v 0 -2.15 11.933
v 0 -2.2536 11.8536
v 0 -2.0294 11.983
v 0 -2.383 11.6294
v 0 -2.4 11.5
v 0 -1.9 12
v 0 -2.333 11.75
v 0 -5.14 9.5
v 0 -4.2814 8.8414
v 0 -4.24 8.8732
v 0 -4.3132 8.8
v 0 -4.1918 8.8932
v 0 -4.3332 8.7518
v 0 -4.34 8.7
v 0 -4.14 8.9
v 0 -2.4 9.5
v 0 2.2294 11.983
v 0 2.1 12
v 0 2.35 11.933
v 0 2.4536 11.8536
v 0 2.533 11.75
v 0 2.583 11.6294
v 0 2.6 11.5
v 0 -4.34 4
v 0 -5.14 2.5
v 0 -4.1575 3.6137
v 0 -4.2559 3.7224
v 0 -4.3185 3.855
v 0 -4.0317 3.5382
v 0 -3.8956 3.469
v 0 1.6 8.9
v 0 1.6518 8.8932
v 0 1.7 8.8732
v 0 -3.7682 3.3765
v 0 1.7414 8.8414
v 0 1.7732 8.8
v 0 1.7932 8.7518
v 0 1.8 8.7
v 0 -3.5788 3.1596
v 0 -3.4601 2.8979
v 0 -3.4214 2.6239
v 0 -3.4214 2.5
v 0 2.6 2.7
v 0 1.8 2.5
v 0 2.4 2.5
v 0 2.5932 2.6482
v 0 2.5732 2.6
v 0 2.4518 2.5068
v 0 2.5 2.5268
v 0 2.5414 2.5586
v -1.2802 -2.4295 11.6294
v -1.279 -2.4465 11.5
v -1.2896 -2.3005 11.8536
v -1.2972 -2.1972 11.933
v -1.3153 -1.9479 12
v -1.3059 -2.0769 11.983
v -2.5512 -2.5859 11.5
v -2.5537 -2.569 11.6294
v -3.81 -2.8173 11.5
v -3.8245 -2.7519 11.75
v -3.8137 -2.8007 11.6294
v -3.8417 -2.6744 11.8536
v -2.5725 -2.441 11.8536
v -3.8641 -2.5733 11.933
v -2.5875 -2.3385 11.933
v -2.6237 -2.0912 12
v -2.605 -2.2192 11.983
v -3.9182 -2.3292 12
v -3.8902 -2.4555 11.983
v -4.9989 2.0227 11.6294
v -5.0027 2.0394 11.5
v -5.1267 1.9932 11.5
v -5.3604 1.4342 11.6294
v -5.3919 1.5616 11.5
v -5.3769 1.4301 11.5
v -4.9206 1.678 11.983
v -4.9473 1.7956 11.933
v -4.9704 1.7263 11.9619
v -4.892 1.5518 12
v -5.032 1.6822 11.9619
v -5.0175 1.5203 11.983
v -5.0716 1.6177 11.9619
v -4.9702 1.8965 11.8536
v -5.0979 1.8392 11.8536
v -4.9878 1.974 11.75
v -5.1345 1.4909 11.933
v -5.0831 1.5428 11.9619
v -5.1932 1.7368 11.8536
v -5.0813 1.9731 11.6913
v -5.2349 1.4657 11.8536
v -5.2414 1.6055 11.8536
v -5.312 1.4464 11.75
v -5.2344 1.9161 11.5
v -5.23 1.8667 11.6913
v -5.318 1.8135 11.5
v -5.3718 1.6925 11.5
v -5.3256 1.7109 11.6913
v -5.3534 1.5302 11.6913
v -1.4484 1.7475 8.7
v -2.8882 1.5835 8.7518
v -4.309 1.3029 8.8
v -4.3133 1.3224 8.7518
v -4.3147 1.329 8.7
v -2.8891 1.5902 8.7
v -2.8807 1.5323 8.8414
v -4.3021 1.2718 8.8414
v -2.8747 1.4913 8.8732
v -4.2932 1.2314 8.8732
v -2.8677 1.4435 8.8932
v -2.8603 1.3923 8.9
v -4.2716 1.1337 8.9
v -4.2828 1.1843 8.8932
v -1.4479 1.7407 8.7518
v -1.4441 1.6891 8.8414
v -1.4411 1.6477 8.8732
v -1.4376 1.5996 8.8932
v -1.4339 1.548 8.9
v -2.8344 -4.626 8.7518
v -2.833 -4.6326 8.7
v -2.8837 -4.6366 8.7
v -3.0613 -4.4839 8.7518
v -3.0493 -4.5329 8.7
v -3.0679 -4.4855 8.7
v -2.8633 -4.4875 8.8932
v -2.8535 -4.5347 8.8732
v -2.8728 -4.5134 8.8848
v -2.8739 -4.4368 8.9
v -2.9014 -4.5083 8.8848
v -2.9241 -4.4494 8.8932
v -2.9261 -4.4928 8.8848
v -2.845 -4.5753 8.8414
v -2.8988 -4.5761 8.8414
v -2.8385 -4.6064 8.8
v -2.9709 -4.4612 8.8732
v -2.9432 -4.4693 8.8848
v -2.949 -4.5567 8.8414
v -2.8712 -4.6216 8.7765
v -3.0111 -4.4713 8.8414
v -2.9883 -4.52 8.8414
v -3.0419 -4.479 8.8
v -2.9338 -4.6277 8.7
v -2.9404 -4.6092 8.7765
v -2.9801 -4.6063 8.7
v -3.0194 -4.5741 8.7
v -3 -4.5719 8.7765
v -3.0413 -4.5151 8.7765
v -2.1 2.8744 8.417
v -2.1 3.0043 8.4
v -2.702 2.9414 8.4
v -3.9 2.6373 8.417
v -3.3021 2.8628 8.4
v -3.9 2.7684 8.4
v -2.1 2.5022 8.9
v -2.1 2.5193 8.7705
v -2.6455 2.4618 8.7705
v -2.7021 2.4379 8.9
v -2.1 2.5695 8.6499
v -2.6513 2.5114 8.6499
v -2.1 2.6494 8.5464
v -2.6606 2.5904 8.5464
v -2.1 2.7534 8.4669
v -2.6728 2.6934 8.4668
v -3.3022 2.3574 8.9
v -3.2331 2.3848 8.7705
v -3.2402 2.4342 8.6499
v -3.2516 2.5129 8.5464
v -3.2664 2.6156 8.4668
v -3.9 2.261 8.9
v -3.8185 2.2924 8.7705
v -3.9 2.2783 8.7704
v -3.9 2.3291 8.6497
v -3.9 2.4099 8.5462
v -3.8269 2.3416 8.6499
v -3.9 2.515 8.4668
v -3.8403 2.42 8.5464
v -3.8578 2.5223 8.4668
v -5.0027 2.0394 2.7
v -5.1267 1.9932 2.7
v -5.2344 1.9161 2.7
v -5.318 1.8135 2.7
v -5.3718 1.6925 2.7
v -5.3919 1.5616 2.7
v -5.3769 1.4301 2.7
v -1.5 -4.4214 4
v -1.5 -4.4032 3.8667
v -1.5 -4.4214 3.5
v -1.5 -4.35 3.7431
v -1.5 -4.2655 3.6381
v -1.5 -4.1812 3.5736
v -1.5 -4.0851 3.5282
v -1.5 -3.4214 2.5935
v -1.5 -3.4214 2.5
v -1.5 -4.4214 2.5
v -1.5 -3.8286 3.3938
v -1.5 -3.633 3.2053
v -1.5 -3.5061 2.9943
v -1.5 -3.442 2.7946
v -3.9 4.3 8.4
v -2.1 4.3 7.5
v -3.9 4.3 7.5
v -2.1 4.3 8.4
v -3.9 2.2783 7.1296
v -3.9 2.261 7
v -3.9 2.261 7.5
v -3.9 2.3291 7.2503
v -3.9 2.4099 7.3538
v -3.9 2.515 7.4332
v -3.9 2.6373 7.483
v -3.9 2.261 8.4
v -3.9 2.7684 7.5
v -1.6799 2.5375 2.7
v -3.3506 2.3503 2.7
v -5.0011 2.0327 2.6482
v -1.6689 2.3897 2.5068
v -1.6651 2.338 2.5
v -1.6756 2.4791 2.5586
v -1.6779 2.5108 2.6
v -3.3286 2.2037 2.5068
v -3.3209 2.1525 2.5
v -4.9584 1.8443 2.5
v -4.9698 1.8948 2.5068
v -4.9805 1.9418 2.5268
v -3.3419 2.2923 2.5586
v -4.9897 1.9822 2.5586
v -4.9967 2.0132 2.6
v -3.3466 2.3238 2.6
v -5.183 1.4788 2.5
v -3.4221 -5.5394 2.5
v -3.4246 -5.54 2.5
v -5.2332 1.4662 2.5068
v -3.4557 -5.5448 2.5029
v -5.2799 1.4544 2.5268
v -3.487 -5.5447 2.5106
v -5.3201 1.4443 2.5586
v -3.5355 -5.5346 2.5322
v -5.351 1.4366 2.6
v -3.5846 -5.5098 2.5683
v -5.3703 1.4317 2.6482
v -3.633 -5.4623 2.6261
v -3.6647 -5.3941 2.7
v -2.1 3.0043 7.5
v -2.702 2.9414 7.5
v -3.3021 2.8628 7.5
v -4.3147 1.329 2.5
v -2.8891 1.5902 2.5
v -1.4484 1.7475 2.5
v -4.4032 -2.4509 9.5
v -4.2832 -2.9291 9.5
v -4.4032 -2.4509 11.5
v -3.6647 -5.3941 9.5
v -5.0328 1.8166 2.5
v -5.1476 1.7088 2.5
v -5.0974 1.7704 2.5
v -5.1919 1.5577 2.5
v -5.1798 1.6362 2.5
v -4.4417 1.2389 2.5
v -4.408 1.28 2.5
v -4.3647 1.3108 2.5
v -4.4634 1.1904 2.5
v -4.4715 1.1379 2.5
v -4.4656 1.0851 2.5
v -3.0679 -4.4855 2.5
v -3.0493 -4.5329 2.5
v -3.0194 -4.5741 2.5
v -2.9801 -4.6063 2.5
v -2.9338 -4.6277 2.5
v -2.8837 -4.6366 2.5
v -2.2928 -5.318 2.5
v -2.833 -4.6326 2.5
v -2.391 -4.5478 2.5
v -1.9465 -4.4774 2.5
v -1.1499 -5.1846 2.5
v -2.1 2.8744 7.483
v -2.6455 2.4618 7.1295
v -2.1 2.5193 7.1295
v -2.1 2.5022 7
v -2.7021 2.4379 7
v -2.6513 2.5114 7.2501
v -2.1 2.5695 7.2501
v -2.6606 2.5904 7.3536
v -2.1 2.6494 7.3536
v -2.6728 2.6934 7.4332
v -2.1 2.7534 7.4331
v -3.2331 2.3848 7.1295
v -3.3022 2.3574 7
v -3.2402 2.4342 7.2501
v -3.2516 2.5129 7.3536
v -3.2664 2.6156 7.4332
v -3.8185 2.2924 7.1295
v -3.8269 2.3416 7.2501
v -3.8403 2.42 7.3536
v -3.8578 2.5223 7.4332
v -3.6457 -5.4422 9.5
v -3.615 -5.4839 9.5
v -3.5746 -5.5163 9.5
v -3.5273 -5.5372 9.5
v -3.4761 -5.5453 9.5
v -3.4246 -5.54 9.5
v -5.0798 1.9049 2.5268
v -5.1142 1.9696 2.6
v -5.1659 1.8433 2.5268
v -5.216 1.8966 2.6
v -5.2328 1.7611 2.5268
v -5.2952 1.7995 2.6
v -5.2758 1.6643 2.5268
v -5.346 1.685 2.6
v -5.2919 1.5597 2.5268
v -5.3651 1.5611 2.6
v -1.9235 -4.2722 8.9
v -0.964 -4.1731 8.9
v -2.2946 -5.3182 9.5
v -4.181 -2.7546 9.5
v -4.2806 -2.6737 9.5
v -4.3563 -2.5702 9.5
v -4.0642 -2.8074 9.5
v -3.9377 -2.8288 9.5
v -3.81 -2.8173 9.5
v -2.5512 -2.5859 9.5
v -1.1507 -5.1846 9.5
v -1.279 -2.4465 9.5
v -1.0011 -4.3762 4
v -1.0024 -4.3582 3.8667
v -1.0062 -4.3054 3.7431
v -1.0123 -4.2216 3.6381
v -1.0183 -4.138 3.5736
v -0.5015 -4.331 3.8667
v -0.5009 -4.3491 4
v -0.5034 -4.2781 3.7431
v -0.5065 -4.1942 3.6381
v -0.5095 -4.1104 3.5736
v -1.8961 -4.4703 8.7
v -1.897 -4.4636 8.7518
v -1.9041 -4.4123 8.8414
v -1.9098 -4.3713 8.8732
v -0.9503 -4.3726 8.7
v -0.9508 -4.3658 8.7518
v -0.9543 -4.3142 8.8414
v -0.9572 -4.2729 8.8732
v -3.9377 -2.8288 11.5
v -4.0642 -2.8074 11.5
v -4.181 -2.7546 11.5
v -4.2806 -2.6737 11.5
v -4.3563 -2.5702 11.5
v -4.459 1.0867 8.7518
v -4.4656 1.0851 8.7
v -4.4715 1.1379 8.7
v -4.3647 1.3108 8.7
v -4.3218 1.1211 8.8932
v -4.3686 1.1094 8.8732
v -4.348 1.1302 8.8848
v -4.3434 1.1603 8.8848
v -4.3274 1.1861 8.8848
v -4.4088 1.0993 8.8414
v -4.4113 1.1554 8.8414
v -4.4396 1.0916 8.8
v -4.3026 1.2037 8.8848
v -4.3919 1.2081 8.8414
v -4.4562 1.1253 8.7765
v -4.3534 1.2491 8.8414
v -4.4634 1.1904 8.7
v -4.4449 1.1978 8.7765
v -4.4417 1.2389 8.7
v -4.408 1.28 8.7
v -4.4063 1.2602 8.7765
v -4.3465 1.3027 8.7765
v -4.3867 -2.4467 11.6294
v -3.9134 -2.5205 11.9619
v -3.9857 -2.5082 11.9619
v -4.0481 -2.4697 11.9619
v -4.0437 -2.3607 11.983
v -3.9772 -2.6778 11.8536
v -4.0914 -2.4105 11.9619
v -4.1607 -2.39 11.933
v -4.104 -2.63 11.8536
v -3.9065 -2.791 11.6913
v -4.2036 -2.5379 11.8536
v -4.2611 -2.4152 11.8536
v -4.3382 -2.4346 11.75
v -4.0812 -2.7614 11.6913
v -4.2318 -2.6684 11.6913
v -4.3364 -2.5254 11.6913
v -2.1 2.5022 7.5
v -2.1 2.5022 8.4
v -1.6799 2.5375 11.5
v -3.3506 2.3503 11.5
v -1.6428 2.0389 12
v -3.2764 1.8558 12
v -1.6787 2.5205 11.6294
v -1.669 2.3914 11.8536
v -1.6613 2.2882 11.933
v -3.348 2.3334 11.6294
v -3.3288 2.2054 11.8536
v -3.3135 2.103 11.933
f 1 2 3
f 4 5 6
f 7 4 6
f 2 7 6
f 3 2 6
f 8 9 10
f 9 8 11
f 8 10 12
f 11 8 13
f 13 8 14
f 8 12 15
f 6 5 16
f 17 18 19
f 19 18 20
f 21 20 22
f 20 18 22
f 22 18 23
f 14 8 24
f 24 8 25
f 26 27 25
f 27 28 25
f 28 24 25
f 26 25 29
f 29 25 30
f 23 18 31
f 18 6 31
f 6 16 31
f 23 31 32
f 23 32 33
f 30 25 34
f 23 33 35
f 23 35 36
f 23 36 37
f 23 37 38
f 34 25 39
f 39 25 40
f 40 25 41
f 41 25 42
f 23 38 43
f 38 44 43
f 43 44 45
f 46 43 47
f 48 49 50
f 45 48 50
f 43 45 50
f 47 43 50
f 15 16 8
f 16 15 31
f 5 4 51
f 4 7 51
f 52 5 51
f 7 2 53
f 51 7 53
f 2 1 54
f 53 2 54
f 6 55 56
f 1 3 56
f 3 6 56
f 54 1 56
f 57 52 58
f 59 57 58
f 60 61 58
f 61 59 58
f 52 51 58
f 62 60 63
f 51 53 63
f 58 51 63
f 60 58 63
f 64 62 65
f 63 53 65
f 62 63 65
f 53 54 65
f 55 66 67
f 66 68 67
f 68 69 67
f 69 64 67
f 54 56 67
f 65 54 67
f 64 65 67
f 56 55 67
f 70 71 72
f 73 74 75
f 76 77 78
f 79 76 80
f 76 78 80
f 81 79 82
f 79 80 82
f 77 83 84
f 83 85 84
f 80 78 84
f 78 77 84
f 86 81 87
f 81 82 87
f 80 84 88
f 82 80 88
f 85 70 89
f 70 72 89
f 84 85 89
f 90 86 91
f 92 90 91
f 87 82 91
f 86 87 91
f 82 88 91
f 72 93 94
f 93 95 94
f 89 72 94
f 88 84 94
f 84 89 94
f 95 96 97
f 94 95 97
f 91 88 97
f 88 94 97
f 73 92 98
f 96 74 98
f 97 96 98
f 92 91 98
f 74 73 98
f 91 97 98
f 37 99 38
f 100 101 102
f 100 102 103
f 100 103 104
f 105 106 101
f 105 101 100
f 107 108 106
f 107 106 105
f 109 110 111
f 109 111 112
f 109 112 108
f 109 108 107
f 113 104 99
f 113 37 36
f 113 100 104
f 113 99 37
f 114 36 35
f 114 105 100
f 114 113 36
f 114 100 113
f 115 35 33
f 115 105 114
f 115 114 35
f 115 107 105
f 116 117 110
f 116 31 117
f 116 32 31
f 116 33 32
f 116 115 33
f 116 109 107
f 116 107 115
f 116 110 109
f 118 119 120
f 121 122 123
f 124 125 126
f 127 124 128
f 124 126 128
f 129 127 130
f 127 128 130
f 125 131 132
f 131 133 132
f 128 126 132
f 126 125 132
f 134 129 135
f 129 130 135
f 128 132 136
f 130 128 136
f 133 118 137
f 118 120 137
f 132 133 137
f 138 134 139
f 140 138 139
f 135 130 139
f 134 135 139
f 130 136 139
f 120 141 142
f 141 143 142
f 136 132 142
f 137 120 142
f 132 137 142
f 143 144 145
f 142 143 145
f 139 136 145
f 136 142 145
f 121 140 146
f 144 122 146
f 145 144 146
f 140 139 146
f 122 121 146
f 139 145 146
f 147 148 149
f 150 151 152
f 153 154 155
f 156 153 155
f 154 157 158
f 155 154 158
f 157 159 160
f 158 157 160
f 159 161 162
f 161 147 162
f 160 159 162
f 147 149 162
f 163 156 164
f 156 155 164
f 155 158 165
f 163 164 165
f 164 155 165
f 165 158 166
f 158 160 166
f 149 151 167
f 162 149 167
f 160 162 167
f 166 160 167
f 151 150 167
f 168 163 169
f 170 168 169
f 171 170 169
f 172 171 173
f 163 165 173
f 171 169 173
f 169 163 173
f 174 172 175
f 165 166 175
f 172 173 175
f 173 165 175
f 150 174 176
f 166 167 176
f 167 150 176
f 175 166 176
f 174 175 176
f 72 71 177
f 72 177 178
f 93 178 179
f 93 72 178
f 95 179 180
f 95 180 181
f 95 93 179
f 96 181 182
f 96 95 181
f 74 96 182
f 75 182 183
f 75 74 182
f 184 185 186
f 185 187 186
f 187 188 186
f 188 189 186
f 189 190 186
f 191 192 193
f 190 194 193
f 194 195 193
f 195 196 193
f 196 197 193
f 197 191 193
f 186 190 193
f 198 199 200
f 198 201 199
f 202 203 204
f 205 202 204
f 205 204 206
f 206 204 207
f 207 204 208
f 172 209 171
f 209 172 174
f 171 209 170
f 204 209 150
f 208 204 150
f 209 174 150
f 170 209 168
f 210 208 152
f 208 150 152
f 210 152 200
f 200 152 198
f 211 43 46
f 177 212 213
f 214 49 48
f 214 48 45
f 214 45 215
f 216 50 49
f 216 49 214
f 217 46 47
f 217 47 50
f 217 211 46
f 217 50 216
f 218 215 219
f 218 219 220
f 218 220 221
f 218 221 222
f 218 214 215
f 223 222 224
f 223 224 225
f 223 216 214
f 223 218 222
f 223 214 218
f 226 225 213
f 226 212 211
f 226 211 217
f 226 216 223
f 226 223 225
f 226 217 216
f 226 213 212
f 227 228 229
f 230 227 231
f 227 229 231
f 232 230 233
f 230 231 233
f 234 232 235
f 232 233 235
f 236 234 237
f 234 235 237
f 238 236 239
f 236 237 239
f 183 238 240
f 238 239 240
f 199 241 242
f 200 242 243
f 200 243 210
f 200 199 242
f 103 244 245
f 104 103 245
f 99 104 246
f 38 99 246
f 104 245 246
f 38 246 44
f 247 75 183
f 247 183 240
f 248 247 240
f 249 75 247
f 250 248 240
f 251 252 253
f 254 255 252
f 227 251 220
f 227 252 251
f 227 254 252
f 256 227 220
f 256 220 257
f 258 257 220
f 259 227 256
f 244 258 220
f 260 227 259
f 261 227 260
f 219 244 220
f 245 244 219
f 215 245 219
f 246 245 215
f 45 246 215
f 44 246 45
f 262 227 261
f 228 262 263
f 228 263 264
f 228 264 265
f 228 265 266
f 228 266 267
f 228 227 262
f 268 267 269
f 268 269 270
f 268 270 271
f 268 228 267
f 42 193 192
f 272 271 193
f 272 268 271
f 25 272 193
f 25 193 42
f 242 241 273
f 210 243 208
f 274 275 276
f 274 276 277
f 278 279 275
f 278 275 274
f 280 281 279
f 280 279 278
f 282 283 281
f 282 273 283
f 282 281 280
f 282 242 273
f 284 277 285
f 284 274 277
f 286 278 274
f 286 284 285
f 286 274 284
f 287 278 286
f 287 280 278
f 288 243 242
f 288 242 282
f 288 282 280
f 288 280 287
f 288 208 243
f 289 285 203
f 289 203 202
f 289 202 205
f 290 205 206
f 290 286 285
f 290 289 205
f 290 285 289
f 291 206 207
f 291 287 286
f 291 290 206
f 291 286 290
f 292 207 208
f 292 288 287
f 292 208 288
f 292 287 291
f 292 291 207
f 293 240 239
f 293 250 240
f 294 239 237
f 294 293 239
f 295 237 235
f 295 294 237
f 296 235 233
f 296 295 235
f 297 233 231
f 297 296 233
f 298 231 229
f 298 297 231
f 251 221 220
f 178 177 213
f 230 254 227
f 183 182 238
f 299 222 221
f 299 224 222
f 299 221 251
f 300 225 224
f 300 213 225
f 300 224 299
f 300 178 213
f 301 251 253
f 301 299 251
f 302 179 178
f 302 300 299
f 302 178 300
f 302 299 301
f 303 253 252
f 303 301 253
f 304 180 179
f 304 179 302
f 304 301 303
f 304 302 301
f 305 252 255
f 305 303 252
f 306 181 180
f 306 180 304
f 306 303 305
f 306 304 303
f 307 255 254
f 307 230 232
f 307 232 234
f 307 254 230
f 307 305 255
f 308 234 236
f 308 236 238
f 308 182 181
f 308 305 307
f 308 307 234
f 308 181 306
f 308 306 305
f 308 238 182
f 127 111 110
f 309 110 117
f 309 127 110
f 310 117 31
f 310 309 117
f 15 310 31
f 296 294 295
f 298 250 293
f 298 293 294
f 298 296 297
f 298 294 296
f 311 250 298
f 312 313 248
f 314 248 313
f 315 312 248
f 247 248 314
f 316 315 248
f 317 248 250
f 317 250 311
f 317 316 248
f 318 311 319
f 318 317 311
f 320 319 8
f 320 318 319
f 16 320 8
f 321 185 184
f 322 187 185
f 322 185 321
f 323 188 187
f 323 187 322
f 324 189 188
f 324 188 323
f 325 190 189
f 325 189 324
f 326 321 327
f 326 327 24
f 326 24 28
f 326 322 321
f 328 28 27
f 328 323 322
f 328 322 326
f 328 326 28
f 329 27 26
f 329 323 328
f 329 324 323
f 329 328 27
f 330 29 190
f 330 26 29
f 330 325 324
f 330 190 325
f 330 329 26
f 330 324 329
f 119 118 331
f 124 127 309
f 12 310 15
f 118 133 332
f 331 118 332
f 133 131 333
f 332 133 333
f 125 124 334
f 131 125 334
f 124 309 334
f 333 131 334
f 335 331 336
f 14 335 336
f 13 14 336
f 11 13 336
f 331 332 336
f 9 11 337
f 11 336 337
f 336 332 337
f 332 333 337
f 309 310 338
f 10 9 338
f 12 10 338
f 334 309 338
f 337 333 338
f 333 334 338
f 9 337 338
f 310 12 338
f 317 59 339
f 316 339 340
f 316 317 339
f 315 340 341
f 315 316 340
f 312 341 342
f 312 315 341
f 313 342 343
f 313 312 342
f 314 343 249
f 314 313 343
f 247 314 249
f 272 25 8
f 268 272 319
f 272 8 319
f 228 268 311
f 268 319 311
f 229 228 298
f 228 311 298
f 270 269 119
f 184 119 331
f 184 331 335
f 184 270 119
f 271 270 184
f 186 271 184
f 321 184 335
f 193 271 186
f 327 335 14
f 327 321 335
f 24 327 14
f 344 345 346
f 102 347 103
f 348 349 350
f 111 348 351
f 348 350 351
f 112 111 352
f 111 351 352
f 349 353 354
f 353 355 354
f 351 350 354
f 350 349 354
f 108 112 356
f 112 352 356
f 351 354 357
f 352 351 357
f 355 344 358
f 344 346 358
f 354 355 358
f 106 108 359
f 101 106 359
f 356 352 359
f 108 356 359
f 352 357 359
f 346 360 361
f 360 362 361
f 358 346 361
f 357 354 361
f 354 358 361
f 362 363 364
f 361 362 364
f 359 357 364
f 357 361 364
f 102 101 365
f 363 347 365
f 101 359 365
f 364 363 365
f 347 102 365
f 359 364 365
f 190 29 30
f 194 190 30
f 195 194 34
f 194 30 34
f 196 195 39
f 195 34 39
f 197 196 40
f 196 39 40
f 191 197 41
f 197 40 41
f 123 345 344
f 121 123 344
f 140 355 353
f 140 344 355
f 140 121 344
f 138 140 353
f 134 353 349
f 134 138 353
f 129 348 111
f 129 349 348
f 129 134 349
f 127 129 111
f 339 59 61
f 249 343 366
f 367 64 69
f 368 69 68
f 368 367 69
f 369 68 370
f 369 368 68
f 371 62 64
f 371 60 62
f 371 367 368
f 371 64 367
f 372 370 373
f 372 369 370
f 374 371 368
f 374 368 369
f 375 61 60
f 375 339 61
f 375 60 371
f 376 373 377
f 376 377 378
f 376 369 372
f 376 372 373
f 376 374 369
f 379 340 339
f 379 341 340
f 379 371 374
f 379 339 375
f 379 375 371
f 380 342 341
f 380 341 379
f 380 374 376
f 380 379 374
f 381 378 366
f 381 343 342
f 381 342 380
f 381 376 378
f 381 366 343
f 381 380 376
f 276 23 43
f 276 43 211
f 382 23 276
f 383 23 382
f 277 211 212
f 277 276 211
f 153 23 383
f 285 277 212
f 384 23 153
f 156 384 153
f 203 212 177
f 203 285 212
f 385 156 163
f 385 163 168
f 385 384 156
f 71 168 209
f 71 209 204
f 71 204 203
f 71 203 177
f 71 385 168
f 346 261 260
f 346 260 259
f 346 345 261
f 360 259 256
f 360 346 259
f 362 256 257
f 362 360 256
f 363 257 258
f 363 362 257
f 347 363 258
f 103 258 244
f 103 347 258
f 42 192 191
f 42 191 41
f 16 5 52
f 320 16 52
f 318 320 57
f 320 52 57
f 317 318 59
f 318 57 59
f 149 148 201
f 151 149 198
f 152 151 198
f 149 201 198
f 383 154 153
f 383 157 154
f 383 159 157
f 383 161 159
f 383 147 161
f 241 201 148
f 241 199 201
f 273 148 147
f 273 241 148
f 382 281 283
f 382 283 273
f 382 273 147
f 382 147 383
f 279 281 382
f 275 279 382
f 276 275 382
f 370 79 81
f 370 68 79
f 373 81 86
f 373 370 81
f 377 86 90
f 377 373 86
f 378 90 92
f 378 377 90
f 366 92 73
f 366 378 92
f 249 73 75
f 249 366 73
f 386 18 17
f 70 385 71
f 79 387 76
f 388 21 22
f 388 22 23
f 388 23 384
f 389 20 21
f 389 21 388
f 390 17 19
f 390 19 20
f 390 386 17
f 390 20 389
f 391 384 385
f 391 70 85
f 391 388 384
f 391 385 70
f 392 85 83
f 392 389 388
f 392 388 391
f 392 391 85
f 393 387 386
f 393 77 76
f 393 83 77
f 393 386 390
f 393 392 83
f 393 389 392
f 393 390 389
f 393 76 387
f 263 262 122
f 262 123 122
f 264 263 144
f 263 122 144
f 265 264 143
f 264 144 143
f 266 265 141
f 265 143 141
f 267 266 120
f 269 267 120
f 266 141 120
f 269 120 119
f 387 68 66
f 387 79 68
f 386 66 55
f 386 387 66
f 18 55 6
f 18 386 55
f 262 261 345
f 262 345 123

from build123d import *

# Parameters (mm, degrees)
BOX_W             = 10
BOX_H             = 15
BOX_DEPTH         = 15
PAD_DEPTH         = 2
PAD_DEPTH_BACK    = 7.5
POCKET_DEPTH      = 6.4
POCKET001_DEPTH   = 2.5
PAD005_DEPTH      = 0.45
PAD005_DEPTH_BACK = 0.45
FILLET_R          = 0.5
FILLET008_R       = 0.2
FILLET009_R       = 0.2
FILLET010_R       = 0.5
SKETCH013_W       = 3
SKETCH013_H       = 1
PAD008_DEPTH      = 1
FILLET015_R       = 0.5
FILLET016_R       = 0.99


with BuildPart() as w_rfelst_elschnitt:
    # Box → Box (new body)
    with BuildSketch(Plane(origin=(0, -9, 0), x_dir=(1, 0, 0), z_dir=(0, 0, 1))):
        with Locations((5, 7.5)):
            Rectangle(BOX_W, BOX_H)
    extrude(amount=BOX_DEPTH)


with BuildPart() as st_el_schnitt:
    # Sketch (on DatumPlane) → Pad (new body, two sides)
    with BuildSketch(Plane.XY.offset(10)) as pad_sk:
        with BuildLine():
            ThreePointArc((5.5, 1.920538), (0, 2.6), (-5.5, 1.920538))
            Line((-5.5, 1.920538), (-3.616372, -5.586761))
            ThreePointArc((3.616372, -5.586761), (0, -5.14), (-3.616372, -5.586761))
            Line((3.616372, -5.586761), (5.5, 1.920538))
        make_face()
    extrude(amount=PAD_DEPTH)
    extrude(pad_sk.sketch, amount=-PAD_DEPTH_BACK)

    # Sketch001 (on Face5 of Pad) → Pocket (cut)
    with BuildSketch(Plane(origin=(0, 0, 2.5), x_dir=(1, 0, 0), z_dir=(0, 0, -1))):
        with BuildLine():
            ThreePointArc((-4.515394, -1.283614), (0, -1.8), (4.515394, -1.283614))
            Line((3.020793, 4.673197), (4.515394, -1.283614))
            ThreePointArc((-3.020793, 4.673197), (0, 4.34), (3.020793, 4.673197))
            Line((-4.515394, -1.283614), (-3.020793, 4.673197))
        make_face()
    extrude(amount=-POCKET_DEPTH, mode=Mode.SUBTRACT)

    # Sketch002 (on Face5 of Pocket) → Pocket001 (cut)
    with BuildSketch(Plane.XY.offset(12)):
        with BuildLine():
            ThreePointArc((4.283186, -2.929138), (0, -2.4), (-4.283186, -2.929138))
            Line((-4.283186, -2.929138), (-3.616372, -5.586761))
            ThreePointArc((3.616372, -5.586761), (0, -5.14), (-3.616372, -5.586761))
            Line((4.283186, -2.929138), (3.616372, -5.586761))
        make_face()
    extrude(amount=-POCKET001_DEPTH, mode=Mode.SUBTRACT)

    # Sketch008 (on DatumPlane) → Pad005 (join, two sides)
    with BuildSketch(Plane.XY.offset(7.95)) as pad005_sk:
        Polygon((-3.9, 2.260952), (-3.9, 4.3), (-3, 4.3), (-2.1, 4.3), (-2.1, 2.502222), align=None)
        Polygon((2.1, 2.502222), (2.1, 4.3), (3, 4.3), (3.9, 4.3), (3.9, 2.260952), align=None)
    extrude(amount=PAD005_DEPTH)
    extrude(pad005_sk.sketch, amount=-PAD005_DEPTH_BACK)

    # Fillet
    fillet_edges = [st_el_schnitt.edges().sort_by_distance(p)[0] for p in [
        (0, -2.4, 12),
        (4.891593, -0.5043, 12),
        (0, 2.6, 12),
        (-4.891593, -0.5043, 12),
        (4.283186, -2.929138, 10.75),
        (5.5, 1.920538, 7.25),
        (-5.5, 1.920538, 7.25),
        (-4.283186, -2.929138, 10.75),
    ]]
    fillet(fillet_edges, radius=FILLET_R)

    # Fillet008
    fillet008_edges = [st_el_schnitt.edges().sort_by_distance(p)[0] for p in [
        (-3.616372, -5.586761, 6),
        (3.616372, -5.586761, 6),
        (-4.496657, -2.078339, 2.5),
        (4.496657, -2.078339, 2.5),
    ]]
    fillet(fillet008_edges, radius=FILLET008_R)

    # Fillet009
    fillet009_edges = [st_el_schnitt.edges().sort_by_distance(p)[0] for p in [
        (0, -4.34, 8.9),
        (-3.768094, -1.694791, 8.9),
        (0, 1.8, 8.9),
        (3.768094, -1.694791, 8.9),
        (4.515394, 1.283614, 5.7),
        (3.020793, -4.673197, 5.7),
        (-3.020793, -4.673197, 5.7),
        (-4.515394, 1.283614, 5.7),
    ]]
    fillet(fillet009_edges, radius=FILLET009_R)

    # Fillet010
    fillet010_edges = [st_el_schnitt.edges().sort_by_distance(p)[0] for p in [
        (-3.002424, 2.399675, 8.4),
        (-3.002424, 2.399675, 7.5),
        (3.002424, 2.399675, 7.5),
        (3.002424, 2.399675, 8.4),
    ]]
    fillet(fillet010_edges, radius=FILLET010_R)

    # Sketch013 (on Face21 of Fillet010) → Pad008 (join)
    with BuildSketch(Plane(origin=(0, 0, 2.5), x_dir=(1, 0, 0), z_dir=(0, 0, -1))):
        with Locations((0, 3.921408)):
            Rectangle(SKETCH013_W, SKETCH013_H)
    extrude(amount=-PAD008_DEPTH)

    # Fillet015
    fillet015_edges = [st_el_schnitt.edges().sort_by_distance(p)[0] for p in [
        (0, -4.34, 3.5),
    ]]
    fillet(fillet015_edges, radius=FILLET015_R)

    # Fillet016
    fillet016_edges = [st_el_schnitt.edges().sort_by_distance(p)[0] for p in [
        (0, -3.421408, 3.5),
    ]]
    fillet(fillet016_edges, radius=FILLET016_R)

    # Cut: cut WürfelStößelSchnitt
    add(w_rfelst_elschnitt.part, mode=Mode.SUBTRACT)


solid = st_el_schnitt.part
